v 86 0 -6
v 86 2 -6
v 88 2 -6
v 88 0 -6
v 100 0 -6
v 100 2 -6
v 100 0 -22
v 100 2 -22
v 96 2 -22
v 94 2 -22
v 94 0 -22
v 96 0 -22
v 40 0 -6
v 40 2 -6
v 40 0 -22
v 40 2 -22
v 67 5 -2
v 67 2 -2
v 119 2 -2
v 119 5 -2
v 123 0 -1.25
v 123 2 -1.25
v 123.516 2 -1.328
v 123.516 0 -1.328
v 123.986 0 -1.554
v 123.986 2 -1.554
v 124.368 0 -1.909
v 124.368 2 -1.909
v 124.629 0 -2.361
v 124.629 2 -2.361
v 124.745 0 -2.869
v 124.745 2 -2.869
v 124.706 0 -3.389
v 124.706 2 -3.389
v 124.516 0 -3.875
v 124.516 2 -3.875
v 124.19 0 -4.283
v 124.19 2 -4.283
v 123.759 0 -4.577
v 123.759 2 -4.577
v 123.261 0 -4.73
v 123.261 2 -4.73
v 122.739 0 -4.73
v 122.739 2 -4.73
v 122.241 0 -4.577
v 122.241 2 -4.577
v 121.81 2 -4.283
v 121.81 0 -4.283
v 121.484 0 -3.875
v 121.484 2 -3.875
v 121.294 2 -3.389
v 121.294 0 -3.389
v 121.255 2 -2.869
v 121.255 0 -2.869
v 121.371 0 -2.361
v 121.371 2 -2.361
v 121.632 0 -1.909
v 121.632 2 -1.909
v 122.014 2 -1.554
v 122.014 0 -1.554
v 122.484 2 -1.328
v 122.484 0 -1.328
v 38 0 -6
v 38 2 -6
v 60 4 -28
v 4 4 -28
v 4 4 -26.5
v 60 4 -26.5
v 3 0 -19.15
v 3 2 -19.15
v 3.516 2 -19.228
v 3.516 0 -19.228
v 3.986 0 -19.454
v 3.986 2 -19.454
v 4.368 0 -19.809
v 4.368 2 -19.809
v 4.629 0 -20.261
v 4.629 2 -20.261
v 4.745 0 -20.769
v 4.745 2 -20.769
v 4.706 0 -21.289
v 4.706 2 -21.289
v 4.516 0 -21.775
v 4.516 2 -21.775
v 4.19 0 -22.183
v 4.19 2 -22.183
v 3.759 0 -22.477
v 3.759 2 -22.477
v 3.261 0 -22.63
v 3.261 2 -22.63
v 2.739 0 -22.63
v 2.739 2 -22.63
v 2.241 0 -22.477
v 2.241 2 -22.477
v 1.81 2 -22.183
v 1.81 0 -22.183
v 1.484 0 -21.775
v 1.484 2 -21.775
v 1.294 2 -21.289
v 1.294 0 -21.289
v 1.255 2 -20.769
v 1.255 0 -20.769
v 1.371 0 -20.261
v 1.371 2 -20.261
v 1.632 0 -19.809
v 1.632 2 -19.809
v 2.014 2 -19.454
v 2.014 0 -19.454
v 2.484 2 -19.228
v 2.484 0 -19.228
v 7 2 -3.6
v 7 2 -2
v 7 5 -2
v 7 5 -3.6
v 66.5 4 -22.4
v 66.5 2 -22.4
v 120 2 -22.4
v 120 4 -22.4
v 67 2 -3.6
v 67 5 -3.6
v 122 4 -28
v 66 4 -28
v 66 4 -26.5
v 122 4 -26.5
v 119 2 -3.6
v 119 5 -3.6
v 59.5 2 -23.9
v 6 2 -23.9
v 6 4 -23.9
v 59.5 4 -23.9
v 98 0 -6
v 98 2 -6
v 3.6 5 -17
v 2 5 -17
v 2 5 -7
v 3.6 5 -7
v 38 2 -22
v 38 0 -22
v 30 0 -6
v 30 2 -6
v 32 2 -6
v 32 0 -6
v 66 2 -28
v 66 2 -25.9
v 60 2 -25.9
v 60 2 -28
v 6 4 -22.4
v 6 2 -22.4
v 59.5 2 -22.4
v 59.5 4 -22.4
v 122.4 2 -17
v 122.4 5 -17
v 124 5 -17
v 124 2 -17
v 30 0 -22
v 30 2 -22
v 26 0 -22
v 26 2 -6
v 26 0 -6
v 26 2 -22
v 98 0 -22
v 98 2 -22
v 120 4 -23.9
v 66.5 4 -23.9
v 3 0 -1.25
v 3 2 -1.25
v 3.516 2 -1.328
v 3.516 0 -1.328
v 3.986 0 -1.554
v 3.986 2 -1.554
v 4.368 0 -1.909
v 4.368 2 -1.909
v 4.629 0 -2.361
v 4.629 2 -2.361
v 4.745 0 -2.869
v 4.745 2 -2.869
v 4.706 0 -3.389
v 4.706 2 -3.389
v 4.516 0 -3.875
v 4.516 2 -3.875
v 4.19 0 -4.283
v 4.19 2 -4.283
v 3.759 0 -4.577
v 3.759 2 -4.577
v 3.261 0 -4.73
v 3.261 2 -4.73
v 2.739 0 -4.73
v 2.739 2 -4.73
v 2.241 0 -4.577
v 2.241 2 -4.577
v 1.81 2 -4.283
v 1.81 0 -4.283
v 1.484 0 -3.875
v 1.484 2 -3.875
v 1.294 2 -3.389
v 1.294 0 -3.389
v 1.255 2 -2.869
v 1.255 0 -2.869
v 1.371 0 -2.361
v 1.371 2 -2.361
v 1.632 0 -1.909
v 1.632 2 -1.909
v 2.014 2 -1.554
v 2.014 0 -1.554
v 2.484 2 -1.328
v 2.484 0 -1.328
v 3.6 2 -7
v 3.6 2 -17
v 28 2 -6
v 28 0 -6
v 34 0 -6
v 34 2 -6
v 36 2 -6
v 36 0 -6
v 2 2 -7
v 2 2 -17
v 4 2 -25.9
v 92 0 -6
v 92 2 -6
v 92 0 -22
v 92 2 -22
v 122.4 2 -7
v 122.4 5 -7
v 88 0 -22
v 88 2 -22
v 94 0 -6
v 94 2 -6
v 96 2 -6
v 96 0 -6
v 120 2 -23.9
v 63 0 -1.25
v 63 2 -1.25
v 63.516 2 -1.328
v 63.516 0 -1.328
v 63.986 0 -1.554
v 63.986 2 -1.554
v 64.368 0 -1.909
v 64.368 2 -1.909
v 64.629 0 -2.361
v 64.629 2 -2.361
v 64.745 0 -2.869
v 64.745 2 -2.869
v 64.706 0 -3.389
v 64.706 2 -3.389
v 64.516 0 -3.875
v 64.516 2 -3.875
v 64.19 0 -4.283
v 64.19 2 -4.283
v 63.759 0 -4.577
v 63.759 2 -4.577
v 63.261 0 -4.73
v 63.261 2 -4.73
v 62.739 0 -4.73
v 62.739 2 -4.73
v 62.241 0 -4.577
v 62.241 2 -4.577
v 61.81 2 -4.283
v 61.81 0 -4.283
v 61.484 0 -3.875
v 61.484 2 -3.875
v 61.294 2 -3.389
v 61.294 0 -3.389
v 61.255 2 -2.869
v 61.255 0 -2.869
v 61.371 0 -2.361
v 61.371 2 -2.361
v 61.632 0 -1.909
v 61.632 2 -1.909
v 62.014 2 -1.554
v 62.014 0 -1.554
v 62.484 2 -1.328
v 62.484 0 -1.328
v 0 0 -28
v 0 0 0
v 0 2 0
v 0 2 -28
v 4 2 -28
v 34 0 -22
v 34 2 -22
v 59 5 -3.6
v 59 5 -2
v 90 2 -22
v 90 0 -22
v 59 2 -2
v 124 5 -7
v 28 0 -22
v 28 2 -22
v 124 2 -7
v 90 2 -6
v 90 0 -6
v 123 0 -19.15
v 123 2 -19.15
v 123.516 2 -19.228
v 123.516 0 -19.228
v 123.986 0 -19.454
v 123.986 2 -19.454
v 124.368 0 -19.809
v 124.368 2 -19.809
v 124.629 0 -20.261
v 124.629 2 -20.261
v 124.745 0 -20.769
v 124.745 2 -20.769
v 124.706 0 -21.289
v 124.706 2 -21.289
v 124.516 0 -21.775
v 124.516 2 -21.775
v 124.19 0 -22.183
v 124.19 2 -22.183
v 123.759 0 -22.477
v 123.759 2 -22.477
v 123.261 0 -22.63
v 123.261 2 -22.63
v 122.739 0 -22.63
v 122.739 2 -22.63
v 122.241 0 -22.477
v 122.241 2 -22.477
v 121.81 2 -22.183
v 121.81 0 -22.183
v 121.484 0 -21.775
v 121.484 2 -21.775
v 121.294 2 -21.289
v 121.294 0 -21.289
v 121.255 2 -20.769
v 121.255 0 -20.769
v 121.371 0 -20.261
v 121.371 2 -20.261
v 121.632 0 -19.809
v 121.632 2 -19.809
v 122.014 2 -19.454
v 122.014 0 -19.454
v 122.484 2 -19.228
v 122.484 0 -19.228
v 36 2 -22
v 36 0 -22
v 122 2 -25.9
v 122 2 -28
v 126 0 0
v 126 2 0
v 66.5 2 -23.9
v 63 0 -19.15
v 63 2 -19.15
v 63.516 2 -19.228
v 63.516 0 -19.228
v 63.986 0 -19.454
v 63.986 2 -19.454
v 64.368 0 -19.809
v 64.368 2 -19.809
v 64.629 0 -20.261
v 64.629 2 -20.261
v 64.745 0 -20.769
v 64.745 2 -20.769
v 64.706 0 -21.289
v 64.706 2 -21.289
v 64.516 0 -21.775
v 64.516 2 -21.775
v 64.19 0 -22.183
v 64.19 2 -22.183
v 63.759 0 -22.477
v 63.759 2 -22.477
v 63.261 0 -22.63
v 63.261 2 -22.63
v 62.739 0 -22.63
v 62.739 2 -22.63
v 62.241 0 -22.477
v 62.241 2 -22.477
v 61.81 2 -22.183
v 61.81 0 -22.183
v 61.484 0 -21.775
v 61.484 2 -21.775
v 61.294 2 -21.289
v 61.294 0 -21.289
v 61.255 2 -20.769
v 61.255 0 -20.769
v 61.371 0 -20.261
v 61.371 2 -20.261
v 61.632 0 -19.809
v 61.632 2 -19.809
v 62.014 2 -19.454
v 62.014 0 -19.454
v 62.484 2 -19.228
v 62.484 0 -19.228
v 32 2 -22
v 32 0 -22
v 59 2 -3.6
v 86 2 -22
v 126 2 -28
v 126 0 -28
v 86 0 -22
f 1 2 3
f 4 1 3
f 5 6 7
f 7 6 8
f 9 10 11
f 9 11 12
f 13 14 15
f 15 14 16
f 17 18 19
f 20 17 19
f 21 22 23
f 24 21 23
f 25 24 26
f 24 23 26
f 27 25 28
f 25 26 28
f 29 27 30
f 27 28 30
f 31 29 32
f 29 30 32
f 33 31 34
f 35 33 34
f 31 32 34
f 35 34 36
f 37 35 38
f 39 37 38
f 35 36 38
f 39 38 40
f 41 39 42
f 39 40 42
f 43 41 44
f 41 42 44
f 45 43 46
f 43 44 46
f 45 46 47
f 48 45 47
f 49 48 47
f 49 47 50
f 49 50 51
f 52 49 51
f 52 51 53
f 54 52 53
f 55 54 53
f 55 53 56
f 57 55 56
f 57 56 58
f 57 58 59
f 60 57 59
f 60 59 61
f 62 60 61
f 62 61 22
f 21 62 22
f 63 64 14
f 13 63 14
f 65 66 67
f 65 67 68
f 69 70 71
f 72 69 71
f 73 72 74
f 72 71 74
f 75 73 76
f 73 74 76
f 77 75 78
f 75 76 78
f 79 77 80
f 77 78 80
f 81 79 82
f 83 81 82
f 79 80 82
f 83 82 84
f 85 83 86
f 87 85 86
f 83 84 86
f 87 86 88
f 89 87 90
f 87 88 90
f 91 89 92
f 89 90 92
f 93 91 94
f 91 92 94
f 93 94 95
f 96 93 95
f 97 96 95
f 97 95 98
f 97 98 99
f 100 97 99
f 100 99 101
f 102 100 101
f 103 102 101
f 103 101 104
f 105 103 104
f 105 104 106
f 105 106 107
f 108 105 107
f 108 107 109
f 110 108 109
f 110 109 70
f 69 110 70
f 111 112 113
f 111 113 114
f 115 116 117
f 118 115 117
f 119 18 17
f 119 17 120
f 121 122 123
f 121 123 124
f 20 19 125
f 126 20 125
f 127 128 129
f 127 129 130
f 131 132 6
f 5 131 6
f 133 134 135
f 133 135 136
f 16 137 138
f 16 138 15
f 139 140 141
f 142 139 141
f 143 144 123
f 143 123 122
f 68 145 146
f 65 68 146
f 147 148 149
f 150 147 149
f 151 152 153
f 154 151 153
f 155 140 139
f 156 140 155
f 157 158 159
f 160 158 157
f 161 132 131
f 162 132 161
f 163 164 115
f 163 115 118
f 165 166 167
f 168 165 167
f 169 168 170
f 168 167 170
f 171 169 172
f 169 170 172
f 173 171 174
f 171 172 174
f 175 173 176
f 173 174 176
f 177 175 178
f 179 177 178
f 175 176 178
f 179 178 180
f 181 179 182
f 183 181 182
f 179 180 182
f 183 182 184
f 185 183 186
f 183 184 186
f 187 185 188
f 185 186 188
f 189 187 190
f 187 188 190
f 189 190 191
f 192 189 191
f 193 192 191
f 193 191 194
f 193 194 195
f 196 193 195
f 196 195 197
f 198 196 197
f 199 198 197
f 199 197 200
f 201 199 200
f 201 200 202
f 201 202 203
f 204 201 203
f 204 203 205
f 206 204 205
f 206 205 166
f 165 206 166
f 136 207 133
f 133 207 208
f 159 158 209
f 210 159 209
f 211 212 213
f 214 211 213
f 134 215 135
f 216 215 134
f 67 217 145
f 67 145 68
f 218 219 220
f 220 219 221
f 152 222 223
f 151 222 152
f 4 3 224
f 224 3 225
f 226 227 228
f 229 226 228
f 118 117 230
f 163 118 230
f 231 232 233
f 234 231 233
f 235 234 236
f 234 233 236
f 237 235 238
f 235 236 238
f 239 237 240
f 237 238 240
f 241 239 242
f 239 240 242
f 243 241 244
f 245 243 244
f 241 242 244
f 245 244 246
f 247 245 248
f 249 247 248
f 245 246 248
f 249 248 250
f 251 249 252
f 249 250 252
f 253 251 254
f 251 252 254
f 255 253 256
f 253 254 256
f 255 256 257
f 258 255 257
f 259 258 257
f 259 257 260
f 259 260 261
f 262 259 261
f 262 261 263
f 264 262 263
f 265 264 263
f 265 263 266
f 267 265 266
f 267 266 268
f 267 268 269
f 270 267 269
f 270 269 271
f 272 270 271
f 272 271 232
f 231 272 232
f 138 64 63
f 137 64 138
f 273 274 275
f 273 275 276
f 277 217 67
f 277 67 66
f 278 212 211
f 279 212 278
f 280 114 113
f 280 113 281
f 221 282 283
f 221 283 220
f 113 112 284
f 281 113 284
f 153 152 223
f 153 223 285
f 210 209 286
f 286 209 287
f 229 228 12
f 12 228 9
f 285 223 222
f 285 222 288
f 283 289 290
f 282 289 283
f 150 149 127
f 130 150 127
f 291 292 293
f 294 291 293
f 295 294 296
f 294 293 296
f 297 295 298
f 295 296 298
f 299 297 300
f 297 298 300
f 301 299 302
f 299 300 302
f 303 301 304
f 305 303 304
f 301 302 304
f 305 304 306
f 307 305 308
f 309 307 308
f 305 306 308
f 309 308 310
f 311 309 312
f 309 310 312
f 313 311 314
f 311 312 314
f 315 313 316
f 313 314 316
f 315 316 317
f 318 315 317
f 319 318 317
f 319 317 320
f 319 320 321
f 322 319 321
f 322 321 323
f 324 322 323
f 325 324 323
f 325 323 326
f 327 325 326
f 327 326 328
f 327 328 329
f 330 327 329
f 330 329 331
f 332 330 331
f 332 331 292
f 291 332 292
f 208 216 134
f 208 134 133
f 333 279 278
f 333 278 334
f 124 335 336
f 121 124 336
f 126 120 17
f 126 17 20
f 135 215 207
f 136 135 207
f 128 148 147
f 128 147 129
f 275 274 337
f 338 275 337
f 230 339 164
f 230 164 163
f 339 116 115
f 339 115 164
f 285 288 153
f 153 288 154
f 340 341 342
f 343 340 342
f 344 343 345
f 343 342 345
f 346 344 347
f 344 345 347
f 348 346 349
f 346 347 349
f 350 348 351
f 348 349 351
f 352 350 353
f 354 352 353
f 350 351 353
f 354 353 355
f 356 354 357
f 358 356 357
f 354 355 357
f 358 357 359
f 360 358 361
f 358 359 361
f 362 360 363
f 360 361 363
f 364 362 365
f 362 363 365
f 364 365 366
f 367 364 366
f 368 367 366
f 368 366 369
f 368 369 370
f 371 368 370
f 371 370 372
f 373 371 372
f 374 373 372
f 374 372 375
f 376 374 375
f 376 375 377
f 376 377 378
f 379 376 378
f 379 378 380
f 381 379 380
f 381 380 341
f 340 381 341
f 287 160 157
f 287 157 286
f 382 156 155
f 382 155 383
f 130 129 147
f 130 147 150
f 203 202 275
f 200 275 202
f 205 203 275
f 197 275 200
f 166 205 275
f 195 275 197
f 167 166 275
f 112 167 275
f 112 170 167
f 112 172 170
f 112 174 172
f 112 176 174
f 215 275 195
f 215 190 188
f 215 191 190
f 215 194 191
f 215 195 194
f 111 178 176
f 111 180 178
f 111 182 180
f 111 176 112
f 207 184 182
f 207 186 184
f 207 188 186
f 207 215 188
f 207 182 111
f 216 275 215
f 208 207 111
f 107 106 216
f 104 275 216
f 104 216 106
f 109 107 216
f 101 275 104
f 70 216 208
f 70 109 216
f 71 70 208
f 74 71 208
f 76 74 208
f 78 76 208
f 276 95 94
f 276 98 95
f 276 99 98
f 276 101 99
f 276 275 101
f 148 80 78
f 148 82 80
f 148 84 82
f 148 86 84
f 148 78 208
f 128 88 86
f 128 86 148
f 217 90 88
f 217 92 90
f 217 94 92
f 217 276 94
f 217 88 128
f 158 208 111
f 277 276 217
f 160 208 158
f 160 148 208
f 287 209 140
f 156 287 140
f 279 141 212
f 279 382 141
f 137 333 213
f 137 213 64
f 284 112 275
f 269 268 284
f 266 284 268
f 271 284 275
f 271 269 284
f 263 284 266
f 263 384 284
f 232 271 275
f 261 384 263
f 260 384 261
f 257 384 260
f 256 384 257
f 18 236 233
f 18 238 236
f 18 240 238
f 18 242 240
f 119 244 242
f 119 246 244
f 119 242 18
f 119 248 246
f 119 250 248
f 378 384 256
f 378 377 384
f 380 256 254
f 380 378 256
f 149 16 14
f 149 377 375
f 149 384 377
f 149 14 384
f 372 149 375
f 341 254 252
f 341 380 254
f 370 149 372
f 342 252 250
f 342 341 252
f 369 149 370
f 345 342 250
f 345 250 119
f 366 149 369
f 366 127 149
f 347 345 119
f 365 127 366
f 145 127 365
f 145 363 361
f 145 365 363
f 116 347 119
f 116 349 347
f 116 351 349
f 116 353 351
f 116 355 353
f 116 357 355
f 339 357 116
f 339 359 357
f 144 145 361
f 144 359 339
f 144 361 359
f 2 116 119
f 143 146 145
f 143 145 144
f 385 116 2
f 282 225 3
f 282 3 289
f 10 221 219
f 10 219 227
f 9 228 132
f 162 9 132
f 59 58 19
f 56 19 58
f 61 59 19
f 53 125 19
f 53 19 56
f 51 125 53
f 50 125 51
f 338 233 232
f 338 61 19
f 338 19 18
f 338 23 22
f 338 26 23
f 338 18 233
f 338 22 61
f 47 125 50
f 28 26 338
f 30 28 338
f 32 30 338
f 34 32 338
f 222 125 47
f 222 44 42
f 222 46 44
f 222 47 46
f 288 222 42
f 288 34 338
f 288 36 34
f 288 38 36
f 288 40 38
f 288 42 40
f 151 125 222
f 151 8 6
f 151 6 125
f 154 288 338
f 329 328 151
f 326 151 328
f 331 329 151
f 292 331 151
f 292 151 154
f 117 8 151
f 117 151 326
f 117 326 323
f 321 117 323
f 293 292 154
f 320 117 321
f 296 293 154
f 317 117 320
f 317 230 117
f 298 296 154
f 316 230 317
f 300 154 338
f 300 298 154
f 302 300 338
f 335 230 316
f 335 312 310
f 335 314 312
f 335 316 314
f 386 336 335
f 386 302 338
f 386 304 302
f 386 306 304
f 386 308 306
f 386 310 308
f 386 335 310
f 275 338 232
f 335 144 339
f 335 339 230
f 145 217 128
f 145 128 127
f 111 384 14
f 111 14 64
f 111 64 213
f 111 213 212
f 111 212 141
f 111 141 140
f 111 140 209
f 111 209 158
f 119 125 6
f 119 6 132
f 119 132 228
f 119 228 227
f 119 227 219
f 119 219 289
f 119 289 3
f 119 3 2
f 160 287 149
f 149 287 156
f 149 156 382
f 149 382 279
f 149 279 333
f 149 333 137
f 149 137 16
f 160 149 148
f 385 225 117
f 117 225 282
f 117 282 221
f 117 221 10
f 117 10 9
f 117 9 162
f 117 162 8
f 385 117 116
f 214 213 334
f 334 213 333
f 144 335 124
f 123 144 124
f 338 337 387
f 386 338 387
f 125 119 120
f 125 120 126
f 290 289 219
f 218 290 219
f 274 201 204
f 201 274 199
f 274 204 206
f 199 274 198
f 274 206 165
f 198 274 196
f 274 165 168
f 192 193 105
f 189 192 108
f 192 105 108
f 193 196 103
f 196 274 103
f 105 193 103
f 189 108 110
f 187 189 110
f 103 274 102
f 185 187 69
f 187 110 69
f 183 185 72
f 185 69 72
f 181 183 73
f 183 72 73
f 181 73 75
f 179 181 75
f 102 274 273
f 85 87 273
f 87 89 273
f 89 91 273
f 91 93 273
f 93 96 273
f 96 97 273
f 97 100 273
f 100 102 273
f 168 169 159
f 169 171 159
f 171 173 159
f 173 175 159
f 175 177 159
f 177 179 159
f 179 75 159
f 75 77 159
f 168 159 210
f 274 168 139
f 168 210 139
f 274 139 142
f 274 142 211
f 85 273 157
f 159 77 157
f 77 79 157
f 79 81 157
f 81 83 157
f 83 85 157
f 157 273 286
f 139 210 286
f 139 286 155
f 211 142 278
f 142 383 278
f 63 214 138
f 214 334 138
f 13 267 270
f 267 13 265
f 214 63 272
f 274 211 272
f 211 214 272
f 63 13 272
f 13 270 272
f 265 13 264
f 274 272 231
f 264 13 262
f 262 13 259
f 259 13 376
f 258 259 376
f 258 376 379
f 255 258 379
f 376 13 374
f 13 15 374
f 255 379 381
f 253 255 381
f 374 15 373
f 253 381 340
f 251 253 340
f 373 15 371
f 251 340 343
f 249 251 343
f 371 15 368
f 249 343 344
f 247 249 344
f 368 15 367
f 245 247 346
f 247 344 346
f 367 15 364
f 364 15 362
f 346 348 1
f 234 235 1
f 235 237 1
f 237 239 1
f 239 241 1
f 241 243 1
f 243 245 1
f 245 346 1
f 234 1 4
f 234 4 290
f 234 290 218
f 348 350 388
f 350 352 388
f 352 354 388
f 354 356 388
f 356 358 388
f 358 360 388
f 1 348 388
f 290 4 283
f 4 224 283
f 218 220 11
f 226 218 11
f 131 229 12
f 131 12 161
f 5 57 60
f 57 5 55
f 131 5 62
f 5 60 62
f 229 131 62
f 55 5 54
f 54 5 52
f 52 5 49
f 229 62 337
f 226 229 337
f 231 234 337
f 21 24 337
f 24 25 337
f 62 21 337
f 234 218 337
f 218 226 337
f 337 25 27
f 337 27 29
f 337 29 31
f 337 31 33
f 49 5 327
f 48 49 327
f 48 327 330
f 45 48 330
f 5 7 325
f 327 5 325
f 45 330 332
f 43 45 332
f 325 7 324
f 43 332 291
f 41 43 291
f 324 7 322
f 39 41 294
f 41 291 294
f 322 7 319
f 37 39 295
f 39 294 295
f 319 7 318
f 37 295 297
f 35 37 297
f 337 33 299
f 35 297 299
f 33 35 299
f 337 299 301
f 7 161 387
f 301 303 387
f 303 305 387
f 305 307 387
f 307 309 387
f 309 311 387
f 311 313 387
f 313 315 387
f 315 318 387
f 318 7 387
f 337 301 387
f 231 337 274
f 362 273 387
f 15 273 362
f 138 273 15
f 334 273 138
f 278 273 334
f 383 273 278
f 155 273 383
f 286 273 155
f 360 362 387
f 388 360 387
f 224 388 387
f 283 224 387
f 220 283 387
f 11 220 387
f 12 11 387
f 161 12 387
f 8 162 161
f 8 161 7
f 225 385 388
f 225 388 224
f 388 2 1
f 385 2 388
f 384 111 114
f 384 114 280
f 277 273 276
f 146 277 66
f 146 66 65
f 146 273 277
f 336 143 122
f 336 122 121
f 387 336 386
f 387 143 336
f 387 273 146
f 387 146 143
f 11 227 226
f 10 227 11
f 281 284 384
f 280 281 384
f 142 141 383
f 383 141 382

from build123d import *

# Parameters (mm, degrees)
SKIZZE1_W                       = 126
SKIZZE1_H                       = 28
AUFSATZ_LINEAR_AUSTRAGEN1_DEPTH = 2
SKIZZE2_R                       = 1.75
SCHNITT_LINEAR_AUSTRAGEN1_DEPTH = 130.089116505
SKIZZE3_W                       = 2
SKIZZE3_H                       = 16
SCHNITT_LINEAR_AUSTRAGEN2_DEPTH = 130.089116505
LINEARES_MUSTER1_COUNT          = 4
LINEARES_MUSTER1_PITCH          = 4
SKIZZE4_W                       = 2
SKIZZE4_H                       = 16
SCHNITT_LINEAR_AUSTRAGEN3_DEPTH = 130.089116505
LINEARES_MUSTER2_COUNT          = 4
LINEARES_MUSTER2_PITCH          = 4
SKIZZE5_W                       = 1.6
SKIZZE5_H                       = 10
SKIZZE5_W_2                     = 52
SKIZZE5_H_2                     = 1.6
AUFSATZ_LINEAR_AUSTRAGEN2_DEPTH = 3
SKIZZE6_W                       = 53.5
SKIZZE6_H                       = 1.5
AUFSATZ_LINEAR_AUSTRAGEN3_DEPTH = 2
SKIZZE7_W                       = 56
SKIZZE7_H                       = 2.1
AUFSATZ_LINEAR_AUSTRAGEN4_DEPTH = 2
FASE1_SIZE                      = 2
FASE1_SIZE_2                    = 0.6


with BuildPart() as part:
    # Skizze1 → Aufsatz-Linear austragen1 (new body)
    with BuildSketch(Plane(origin=(0, 0, 0), x_dir=(1, 0, 0), z_dir=(0, 1, 0))):
        with Locations((63, 14)):
            Rectangle(SKIZZE1_W, SKIZZE1_H)
    extrude(amount=AUFSATZ_LINEAR_AUSTRAGEN1_DEPTH)

    # Skizze2 → Schnitt-Linear austragen1 (cut, through all)
    with BuildSketch(Plane(origin=(0, 2, 0), x_dir=(1, 0, 0), z_dir=(0, 1, 0))):
        with Locations(Location((3, 3, 0), (0, 0, 270))):
            Circle(SKIZZE2_R)
        with Locations(Location((3, 20.9, 0), (0, 0, 270))):
            Circle(SKIZZE2_R)
        with Locations(Location((63, 3, 0), (0, 0, 270))):
            Circle(SKIZZE2_R)
        with Locations(Location((63, 20.9, 0), (0, 0, 270))):
            Circle(SKIZZE2_R)
        with Locations(Location((123, 20.9, 0), (0, 0, 270))):
            Circle(SKIZZE2_R)
        with Locations(Location((123, 3, 0), (0, 0, 270))):
            Circle(SKIZZE2_R)
    extrude(amount=-SCHNITT_LINEAR_AUSTRAGEN1_DEPTH, mode=Mode.SUBTRACT)

    # Skizze3 → Schnitt-Linear austragen2 (cut, through all)
    with BuildSketch(Plane(origin=(0, 2, 0), x_dir=(1, 0, 0), z_dir=(0, 1, 0))):
        with Locations((27, 14)):
            Rectangle(SKIZZE3_W, SKIZZE3_H)
    schnitt_linear_austragen2 = extrude(amount=-SCHNITT_LINEAR_AUSTRAGEN2_DEPTH, mode=Mode.SUBTRACT)

    # Lineares Muster1: Schnitt-Linear austragen2 ×4
    with Locations(*[(i * LINEARES_MUSTER1_PITCH, 0, 0) for i in range(1, LINEARES_MUSTER1_COUNT)]):
        add(schnitt_linear_austragen2, mode=Mode.SUBTRACT)

    # Skizze4 → Schnitt-Linear austragen3 (cut, through all)
    with BuildSketch(Plane(origin=(0, 2, 0), x_dir=(1, 0, 0), z_dir=(0, 1, 0))):
        with Locations((99, 14)):
            Rectangle(SKIZZE4_W, SKIZZE4_H)
    schnitt_linear_austragen3 = extrude(amount=-SCHNITT_LINEAR_AUSTRAGEN3_DEPTH, mode=Mode.SUBTRACT)

    # Lineares Muster2: Schnitt-Linear austragen3 ×4
    with Locations(*[(-i * LINEARES_MUSTER2_PITCH, 0, 0) for i in range(1, LINEARES_MUSTER2_COUNT)]):
        add(schnitt_linear_austragen3, mode=Mode.SUBTRACT)

    # Skizze5 → Aufsatz-Linear austragen2 (add)
    with BuildSketch(Plane(origin=(0, 2, 0), x_dir=(1, 0, 0), z_dir=(0, 1, 0))):
        with Locations((2.8, 12)):
            Rectangle(SKIZZE5_W, SKIZZE5_H)
        with Locations((33, 2.8)):
            Rectangle(SKIZZE5_W_2, SKIZZE5_H_2)
        with Locations((93, 2.8)):
            Rectangle(SKIZZE5_W_2, SKIZZE5_H_2)
        with Locations((123.2, 12)):
            Rectangle(SKIZZE5_W, SKIZZE5_H)
    extrude(amount=AUFSATZ_LINEAR_AUSTRAGEN2_DEPTH)

    # Skizze6 → Aufsatz-Linear austragen3 (add)
    with BuildSketch(Plane(origin=(0, 2, 0), x_dir=(1, 0, 0), z_dir=(0, 1, 0))):
        with Locations((32.75, 23.15)):
            Rectangle(SKIZZE6_W, SKIZZE6_H)
        with Locations((93.25, 23.15)):
            Rectangle(SKIZZE6_W, SKIZZE6_H)
    extrude(amount=AUFSATZ_LINEAR_AUSTRAGEN3_DEPTH)

    # Skizze7 → Aufsatz-Linear austragen4 (add)
    with BuildSketch(Plane(origin=(0, 2, 0), x_dir=(1, 0, 0), z_dir=(0, 1, 0))):
        with Locations((32, 26.95)):
            Rectangle(SKIZZE7_W, SKIZZE7_H)
        with Locations((94, 26.95)):
            Rectangle(SKIZZE7_W, SKIZZE7_H)
    extrude(amount=AUFSATZ_LINEAR_AUSTRAGEN4_DEPTH)

    # Fase1
    # the kernel refuses this chamfer: 2, 0.6 mm, written as the material it takes off along each edge
    with BuildSketch(Plane(origin=(127.191883336, 4, -25.9), x_dir=(0, -0.9999387354199845, 0.011069119507991545), z_dir=(-1, 0, 0))) as fase1_piece_1_section:
        Polygon((FASE1_SIZE * 0.99993873542, -FASE1_SIZE * 0.011069119508), (-FASE1_SIZE_2 * 0.011069119508, -FASE1_SIZE_2 * 0.99993873542), (0, 0), align=None)
    fase1_piece_1 = extrude(amount=66.383766671, mode=Mode.PRIVATE)
    fase1_piece_1 = split(fase1_piece_1, bisect_by=Plane(origin=(94, 2, -26.081095953), z_dir=(0, 1, 0)), keep=Keep.TOP, mode=Mode.PRIVATE)
    add(fase1_piece_1, mode=Mode.SUBTRACT)
    with BuildSketch(Plane(origin=(65.191883336, 4, -25.9), x_dir=(0, -0.9999387354199845, 0.011069119507991545), z_dir=(-1, 0, 0))) as fase1_piece_2_section:
        Polygon((FASE1_SIZE * 0.99993873542, -FASE1_SIZE * 0.011069119508), (-FASE1_SIZE_2 * 0.011069119508, -FASE1_SIZE_2 * 0.99993873542), (0, 0), align=None)
    fase1_piece_2 = extrude(amount=66.383766671, mode=Mode.PRIVATE)
    fase1_piece_2 = split(fase1_piece_2, bisect_by=Plane(origin=(32, 2, -26.081095953), z_dir=(0, 1, 0)), keep=Keep.TOP, mode=Mode.PRIVATE)
    add(fase1_piece_2, mode=Mode.SUBTRACT)


solid = part.part
